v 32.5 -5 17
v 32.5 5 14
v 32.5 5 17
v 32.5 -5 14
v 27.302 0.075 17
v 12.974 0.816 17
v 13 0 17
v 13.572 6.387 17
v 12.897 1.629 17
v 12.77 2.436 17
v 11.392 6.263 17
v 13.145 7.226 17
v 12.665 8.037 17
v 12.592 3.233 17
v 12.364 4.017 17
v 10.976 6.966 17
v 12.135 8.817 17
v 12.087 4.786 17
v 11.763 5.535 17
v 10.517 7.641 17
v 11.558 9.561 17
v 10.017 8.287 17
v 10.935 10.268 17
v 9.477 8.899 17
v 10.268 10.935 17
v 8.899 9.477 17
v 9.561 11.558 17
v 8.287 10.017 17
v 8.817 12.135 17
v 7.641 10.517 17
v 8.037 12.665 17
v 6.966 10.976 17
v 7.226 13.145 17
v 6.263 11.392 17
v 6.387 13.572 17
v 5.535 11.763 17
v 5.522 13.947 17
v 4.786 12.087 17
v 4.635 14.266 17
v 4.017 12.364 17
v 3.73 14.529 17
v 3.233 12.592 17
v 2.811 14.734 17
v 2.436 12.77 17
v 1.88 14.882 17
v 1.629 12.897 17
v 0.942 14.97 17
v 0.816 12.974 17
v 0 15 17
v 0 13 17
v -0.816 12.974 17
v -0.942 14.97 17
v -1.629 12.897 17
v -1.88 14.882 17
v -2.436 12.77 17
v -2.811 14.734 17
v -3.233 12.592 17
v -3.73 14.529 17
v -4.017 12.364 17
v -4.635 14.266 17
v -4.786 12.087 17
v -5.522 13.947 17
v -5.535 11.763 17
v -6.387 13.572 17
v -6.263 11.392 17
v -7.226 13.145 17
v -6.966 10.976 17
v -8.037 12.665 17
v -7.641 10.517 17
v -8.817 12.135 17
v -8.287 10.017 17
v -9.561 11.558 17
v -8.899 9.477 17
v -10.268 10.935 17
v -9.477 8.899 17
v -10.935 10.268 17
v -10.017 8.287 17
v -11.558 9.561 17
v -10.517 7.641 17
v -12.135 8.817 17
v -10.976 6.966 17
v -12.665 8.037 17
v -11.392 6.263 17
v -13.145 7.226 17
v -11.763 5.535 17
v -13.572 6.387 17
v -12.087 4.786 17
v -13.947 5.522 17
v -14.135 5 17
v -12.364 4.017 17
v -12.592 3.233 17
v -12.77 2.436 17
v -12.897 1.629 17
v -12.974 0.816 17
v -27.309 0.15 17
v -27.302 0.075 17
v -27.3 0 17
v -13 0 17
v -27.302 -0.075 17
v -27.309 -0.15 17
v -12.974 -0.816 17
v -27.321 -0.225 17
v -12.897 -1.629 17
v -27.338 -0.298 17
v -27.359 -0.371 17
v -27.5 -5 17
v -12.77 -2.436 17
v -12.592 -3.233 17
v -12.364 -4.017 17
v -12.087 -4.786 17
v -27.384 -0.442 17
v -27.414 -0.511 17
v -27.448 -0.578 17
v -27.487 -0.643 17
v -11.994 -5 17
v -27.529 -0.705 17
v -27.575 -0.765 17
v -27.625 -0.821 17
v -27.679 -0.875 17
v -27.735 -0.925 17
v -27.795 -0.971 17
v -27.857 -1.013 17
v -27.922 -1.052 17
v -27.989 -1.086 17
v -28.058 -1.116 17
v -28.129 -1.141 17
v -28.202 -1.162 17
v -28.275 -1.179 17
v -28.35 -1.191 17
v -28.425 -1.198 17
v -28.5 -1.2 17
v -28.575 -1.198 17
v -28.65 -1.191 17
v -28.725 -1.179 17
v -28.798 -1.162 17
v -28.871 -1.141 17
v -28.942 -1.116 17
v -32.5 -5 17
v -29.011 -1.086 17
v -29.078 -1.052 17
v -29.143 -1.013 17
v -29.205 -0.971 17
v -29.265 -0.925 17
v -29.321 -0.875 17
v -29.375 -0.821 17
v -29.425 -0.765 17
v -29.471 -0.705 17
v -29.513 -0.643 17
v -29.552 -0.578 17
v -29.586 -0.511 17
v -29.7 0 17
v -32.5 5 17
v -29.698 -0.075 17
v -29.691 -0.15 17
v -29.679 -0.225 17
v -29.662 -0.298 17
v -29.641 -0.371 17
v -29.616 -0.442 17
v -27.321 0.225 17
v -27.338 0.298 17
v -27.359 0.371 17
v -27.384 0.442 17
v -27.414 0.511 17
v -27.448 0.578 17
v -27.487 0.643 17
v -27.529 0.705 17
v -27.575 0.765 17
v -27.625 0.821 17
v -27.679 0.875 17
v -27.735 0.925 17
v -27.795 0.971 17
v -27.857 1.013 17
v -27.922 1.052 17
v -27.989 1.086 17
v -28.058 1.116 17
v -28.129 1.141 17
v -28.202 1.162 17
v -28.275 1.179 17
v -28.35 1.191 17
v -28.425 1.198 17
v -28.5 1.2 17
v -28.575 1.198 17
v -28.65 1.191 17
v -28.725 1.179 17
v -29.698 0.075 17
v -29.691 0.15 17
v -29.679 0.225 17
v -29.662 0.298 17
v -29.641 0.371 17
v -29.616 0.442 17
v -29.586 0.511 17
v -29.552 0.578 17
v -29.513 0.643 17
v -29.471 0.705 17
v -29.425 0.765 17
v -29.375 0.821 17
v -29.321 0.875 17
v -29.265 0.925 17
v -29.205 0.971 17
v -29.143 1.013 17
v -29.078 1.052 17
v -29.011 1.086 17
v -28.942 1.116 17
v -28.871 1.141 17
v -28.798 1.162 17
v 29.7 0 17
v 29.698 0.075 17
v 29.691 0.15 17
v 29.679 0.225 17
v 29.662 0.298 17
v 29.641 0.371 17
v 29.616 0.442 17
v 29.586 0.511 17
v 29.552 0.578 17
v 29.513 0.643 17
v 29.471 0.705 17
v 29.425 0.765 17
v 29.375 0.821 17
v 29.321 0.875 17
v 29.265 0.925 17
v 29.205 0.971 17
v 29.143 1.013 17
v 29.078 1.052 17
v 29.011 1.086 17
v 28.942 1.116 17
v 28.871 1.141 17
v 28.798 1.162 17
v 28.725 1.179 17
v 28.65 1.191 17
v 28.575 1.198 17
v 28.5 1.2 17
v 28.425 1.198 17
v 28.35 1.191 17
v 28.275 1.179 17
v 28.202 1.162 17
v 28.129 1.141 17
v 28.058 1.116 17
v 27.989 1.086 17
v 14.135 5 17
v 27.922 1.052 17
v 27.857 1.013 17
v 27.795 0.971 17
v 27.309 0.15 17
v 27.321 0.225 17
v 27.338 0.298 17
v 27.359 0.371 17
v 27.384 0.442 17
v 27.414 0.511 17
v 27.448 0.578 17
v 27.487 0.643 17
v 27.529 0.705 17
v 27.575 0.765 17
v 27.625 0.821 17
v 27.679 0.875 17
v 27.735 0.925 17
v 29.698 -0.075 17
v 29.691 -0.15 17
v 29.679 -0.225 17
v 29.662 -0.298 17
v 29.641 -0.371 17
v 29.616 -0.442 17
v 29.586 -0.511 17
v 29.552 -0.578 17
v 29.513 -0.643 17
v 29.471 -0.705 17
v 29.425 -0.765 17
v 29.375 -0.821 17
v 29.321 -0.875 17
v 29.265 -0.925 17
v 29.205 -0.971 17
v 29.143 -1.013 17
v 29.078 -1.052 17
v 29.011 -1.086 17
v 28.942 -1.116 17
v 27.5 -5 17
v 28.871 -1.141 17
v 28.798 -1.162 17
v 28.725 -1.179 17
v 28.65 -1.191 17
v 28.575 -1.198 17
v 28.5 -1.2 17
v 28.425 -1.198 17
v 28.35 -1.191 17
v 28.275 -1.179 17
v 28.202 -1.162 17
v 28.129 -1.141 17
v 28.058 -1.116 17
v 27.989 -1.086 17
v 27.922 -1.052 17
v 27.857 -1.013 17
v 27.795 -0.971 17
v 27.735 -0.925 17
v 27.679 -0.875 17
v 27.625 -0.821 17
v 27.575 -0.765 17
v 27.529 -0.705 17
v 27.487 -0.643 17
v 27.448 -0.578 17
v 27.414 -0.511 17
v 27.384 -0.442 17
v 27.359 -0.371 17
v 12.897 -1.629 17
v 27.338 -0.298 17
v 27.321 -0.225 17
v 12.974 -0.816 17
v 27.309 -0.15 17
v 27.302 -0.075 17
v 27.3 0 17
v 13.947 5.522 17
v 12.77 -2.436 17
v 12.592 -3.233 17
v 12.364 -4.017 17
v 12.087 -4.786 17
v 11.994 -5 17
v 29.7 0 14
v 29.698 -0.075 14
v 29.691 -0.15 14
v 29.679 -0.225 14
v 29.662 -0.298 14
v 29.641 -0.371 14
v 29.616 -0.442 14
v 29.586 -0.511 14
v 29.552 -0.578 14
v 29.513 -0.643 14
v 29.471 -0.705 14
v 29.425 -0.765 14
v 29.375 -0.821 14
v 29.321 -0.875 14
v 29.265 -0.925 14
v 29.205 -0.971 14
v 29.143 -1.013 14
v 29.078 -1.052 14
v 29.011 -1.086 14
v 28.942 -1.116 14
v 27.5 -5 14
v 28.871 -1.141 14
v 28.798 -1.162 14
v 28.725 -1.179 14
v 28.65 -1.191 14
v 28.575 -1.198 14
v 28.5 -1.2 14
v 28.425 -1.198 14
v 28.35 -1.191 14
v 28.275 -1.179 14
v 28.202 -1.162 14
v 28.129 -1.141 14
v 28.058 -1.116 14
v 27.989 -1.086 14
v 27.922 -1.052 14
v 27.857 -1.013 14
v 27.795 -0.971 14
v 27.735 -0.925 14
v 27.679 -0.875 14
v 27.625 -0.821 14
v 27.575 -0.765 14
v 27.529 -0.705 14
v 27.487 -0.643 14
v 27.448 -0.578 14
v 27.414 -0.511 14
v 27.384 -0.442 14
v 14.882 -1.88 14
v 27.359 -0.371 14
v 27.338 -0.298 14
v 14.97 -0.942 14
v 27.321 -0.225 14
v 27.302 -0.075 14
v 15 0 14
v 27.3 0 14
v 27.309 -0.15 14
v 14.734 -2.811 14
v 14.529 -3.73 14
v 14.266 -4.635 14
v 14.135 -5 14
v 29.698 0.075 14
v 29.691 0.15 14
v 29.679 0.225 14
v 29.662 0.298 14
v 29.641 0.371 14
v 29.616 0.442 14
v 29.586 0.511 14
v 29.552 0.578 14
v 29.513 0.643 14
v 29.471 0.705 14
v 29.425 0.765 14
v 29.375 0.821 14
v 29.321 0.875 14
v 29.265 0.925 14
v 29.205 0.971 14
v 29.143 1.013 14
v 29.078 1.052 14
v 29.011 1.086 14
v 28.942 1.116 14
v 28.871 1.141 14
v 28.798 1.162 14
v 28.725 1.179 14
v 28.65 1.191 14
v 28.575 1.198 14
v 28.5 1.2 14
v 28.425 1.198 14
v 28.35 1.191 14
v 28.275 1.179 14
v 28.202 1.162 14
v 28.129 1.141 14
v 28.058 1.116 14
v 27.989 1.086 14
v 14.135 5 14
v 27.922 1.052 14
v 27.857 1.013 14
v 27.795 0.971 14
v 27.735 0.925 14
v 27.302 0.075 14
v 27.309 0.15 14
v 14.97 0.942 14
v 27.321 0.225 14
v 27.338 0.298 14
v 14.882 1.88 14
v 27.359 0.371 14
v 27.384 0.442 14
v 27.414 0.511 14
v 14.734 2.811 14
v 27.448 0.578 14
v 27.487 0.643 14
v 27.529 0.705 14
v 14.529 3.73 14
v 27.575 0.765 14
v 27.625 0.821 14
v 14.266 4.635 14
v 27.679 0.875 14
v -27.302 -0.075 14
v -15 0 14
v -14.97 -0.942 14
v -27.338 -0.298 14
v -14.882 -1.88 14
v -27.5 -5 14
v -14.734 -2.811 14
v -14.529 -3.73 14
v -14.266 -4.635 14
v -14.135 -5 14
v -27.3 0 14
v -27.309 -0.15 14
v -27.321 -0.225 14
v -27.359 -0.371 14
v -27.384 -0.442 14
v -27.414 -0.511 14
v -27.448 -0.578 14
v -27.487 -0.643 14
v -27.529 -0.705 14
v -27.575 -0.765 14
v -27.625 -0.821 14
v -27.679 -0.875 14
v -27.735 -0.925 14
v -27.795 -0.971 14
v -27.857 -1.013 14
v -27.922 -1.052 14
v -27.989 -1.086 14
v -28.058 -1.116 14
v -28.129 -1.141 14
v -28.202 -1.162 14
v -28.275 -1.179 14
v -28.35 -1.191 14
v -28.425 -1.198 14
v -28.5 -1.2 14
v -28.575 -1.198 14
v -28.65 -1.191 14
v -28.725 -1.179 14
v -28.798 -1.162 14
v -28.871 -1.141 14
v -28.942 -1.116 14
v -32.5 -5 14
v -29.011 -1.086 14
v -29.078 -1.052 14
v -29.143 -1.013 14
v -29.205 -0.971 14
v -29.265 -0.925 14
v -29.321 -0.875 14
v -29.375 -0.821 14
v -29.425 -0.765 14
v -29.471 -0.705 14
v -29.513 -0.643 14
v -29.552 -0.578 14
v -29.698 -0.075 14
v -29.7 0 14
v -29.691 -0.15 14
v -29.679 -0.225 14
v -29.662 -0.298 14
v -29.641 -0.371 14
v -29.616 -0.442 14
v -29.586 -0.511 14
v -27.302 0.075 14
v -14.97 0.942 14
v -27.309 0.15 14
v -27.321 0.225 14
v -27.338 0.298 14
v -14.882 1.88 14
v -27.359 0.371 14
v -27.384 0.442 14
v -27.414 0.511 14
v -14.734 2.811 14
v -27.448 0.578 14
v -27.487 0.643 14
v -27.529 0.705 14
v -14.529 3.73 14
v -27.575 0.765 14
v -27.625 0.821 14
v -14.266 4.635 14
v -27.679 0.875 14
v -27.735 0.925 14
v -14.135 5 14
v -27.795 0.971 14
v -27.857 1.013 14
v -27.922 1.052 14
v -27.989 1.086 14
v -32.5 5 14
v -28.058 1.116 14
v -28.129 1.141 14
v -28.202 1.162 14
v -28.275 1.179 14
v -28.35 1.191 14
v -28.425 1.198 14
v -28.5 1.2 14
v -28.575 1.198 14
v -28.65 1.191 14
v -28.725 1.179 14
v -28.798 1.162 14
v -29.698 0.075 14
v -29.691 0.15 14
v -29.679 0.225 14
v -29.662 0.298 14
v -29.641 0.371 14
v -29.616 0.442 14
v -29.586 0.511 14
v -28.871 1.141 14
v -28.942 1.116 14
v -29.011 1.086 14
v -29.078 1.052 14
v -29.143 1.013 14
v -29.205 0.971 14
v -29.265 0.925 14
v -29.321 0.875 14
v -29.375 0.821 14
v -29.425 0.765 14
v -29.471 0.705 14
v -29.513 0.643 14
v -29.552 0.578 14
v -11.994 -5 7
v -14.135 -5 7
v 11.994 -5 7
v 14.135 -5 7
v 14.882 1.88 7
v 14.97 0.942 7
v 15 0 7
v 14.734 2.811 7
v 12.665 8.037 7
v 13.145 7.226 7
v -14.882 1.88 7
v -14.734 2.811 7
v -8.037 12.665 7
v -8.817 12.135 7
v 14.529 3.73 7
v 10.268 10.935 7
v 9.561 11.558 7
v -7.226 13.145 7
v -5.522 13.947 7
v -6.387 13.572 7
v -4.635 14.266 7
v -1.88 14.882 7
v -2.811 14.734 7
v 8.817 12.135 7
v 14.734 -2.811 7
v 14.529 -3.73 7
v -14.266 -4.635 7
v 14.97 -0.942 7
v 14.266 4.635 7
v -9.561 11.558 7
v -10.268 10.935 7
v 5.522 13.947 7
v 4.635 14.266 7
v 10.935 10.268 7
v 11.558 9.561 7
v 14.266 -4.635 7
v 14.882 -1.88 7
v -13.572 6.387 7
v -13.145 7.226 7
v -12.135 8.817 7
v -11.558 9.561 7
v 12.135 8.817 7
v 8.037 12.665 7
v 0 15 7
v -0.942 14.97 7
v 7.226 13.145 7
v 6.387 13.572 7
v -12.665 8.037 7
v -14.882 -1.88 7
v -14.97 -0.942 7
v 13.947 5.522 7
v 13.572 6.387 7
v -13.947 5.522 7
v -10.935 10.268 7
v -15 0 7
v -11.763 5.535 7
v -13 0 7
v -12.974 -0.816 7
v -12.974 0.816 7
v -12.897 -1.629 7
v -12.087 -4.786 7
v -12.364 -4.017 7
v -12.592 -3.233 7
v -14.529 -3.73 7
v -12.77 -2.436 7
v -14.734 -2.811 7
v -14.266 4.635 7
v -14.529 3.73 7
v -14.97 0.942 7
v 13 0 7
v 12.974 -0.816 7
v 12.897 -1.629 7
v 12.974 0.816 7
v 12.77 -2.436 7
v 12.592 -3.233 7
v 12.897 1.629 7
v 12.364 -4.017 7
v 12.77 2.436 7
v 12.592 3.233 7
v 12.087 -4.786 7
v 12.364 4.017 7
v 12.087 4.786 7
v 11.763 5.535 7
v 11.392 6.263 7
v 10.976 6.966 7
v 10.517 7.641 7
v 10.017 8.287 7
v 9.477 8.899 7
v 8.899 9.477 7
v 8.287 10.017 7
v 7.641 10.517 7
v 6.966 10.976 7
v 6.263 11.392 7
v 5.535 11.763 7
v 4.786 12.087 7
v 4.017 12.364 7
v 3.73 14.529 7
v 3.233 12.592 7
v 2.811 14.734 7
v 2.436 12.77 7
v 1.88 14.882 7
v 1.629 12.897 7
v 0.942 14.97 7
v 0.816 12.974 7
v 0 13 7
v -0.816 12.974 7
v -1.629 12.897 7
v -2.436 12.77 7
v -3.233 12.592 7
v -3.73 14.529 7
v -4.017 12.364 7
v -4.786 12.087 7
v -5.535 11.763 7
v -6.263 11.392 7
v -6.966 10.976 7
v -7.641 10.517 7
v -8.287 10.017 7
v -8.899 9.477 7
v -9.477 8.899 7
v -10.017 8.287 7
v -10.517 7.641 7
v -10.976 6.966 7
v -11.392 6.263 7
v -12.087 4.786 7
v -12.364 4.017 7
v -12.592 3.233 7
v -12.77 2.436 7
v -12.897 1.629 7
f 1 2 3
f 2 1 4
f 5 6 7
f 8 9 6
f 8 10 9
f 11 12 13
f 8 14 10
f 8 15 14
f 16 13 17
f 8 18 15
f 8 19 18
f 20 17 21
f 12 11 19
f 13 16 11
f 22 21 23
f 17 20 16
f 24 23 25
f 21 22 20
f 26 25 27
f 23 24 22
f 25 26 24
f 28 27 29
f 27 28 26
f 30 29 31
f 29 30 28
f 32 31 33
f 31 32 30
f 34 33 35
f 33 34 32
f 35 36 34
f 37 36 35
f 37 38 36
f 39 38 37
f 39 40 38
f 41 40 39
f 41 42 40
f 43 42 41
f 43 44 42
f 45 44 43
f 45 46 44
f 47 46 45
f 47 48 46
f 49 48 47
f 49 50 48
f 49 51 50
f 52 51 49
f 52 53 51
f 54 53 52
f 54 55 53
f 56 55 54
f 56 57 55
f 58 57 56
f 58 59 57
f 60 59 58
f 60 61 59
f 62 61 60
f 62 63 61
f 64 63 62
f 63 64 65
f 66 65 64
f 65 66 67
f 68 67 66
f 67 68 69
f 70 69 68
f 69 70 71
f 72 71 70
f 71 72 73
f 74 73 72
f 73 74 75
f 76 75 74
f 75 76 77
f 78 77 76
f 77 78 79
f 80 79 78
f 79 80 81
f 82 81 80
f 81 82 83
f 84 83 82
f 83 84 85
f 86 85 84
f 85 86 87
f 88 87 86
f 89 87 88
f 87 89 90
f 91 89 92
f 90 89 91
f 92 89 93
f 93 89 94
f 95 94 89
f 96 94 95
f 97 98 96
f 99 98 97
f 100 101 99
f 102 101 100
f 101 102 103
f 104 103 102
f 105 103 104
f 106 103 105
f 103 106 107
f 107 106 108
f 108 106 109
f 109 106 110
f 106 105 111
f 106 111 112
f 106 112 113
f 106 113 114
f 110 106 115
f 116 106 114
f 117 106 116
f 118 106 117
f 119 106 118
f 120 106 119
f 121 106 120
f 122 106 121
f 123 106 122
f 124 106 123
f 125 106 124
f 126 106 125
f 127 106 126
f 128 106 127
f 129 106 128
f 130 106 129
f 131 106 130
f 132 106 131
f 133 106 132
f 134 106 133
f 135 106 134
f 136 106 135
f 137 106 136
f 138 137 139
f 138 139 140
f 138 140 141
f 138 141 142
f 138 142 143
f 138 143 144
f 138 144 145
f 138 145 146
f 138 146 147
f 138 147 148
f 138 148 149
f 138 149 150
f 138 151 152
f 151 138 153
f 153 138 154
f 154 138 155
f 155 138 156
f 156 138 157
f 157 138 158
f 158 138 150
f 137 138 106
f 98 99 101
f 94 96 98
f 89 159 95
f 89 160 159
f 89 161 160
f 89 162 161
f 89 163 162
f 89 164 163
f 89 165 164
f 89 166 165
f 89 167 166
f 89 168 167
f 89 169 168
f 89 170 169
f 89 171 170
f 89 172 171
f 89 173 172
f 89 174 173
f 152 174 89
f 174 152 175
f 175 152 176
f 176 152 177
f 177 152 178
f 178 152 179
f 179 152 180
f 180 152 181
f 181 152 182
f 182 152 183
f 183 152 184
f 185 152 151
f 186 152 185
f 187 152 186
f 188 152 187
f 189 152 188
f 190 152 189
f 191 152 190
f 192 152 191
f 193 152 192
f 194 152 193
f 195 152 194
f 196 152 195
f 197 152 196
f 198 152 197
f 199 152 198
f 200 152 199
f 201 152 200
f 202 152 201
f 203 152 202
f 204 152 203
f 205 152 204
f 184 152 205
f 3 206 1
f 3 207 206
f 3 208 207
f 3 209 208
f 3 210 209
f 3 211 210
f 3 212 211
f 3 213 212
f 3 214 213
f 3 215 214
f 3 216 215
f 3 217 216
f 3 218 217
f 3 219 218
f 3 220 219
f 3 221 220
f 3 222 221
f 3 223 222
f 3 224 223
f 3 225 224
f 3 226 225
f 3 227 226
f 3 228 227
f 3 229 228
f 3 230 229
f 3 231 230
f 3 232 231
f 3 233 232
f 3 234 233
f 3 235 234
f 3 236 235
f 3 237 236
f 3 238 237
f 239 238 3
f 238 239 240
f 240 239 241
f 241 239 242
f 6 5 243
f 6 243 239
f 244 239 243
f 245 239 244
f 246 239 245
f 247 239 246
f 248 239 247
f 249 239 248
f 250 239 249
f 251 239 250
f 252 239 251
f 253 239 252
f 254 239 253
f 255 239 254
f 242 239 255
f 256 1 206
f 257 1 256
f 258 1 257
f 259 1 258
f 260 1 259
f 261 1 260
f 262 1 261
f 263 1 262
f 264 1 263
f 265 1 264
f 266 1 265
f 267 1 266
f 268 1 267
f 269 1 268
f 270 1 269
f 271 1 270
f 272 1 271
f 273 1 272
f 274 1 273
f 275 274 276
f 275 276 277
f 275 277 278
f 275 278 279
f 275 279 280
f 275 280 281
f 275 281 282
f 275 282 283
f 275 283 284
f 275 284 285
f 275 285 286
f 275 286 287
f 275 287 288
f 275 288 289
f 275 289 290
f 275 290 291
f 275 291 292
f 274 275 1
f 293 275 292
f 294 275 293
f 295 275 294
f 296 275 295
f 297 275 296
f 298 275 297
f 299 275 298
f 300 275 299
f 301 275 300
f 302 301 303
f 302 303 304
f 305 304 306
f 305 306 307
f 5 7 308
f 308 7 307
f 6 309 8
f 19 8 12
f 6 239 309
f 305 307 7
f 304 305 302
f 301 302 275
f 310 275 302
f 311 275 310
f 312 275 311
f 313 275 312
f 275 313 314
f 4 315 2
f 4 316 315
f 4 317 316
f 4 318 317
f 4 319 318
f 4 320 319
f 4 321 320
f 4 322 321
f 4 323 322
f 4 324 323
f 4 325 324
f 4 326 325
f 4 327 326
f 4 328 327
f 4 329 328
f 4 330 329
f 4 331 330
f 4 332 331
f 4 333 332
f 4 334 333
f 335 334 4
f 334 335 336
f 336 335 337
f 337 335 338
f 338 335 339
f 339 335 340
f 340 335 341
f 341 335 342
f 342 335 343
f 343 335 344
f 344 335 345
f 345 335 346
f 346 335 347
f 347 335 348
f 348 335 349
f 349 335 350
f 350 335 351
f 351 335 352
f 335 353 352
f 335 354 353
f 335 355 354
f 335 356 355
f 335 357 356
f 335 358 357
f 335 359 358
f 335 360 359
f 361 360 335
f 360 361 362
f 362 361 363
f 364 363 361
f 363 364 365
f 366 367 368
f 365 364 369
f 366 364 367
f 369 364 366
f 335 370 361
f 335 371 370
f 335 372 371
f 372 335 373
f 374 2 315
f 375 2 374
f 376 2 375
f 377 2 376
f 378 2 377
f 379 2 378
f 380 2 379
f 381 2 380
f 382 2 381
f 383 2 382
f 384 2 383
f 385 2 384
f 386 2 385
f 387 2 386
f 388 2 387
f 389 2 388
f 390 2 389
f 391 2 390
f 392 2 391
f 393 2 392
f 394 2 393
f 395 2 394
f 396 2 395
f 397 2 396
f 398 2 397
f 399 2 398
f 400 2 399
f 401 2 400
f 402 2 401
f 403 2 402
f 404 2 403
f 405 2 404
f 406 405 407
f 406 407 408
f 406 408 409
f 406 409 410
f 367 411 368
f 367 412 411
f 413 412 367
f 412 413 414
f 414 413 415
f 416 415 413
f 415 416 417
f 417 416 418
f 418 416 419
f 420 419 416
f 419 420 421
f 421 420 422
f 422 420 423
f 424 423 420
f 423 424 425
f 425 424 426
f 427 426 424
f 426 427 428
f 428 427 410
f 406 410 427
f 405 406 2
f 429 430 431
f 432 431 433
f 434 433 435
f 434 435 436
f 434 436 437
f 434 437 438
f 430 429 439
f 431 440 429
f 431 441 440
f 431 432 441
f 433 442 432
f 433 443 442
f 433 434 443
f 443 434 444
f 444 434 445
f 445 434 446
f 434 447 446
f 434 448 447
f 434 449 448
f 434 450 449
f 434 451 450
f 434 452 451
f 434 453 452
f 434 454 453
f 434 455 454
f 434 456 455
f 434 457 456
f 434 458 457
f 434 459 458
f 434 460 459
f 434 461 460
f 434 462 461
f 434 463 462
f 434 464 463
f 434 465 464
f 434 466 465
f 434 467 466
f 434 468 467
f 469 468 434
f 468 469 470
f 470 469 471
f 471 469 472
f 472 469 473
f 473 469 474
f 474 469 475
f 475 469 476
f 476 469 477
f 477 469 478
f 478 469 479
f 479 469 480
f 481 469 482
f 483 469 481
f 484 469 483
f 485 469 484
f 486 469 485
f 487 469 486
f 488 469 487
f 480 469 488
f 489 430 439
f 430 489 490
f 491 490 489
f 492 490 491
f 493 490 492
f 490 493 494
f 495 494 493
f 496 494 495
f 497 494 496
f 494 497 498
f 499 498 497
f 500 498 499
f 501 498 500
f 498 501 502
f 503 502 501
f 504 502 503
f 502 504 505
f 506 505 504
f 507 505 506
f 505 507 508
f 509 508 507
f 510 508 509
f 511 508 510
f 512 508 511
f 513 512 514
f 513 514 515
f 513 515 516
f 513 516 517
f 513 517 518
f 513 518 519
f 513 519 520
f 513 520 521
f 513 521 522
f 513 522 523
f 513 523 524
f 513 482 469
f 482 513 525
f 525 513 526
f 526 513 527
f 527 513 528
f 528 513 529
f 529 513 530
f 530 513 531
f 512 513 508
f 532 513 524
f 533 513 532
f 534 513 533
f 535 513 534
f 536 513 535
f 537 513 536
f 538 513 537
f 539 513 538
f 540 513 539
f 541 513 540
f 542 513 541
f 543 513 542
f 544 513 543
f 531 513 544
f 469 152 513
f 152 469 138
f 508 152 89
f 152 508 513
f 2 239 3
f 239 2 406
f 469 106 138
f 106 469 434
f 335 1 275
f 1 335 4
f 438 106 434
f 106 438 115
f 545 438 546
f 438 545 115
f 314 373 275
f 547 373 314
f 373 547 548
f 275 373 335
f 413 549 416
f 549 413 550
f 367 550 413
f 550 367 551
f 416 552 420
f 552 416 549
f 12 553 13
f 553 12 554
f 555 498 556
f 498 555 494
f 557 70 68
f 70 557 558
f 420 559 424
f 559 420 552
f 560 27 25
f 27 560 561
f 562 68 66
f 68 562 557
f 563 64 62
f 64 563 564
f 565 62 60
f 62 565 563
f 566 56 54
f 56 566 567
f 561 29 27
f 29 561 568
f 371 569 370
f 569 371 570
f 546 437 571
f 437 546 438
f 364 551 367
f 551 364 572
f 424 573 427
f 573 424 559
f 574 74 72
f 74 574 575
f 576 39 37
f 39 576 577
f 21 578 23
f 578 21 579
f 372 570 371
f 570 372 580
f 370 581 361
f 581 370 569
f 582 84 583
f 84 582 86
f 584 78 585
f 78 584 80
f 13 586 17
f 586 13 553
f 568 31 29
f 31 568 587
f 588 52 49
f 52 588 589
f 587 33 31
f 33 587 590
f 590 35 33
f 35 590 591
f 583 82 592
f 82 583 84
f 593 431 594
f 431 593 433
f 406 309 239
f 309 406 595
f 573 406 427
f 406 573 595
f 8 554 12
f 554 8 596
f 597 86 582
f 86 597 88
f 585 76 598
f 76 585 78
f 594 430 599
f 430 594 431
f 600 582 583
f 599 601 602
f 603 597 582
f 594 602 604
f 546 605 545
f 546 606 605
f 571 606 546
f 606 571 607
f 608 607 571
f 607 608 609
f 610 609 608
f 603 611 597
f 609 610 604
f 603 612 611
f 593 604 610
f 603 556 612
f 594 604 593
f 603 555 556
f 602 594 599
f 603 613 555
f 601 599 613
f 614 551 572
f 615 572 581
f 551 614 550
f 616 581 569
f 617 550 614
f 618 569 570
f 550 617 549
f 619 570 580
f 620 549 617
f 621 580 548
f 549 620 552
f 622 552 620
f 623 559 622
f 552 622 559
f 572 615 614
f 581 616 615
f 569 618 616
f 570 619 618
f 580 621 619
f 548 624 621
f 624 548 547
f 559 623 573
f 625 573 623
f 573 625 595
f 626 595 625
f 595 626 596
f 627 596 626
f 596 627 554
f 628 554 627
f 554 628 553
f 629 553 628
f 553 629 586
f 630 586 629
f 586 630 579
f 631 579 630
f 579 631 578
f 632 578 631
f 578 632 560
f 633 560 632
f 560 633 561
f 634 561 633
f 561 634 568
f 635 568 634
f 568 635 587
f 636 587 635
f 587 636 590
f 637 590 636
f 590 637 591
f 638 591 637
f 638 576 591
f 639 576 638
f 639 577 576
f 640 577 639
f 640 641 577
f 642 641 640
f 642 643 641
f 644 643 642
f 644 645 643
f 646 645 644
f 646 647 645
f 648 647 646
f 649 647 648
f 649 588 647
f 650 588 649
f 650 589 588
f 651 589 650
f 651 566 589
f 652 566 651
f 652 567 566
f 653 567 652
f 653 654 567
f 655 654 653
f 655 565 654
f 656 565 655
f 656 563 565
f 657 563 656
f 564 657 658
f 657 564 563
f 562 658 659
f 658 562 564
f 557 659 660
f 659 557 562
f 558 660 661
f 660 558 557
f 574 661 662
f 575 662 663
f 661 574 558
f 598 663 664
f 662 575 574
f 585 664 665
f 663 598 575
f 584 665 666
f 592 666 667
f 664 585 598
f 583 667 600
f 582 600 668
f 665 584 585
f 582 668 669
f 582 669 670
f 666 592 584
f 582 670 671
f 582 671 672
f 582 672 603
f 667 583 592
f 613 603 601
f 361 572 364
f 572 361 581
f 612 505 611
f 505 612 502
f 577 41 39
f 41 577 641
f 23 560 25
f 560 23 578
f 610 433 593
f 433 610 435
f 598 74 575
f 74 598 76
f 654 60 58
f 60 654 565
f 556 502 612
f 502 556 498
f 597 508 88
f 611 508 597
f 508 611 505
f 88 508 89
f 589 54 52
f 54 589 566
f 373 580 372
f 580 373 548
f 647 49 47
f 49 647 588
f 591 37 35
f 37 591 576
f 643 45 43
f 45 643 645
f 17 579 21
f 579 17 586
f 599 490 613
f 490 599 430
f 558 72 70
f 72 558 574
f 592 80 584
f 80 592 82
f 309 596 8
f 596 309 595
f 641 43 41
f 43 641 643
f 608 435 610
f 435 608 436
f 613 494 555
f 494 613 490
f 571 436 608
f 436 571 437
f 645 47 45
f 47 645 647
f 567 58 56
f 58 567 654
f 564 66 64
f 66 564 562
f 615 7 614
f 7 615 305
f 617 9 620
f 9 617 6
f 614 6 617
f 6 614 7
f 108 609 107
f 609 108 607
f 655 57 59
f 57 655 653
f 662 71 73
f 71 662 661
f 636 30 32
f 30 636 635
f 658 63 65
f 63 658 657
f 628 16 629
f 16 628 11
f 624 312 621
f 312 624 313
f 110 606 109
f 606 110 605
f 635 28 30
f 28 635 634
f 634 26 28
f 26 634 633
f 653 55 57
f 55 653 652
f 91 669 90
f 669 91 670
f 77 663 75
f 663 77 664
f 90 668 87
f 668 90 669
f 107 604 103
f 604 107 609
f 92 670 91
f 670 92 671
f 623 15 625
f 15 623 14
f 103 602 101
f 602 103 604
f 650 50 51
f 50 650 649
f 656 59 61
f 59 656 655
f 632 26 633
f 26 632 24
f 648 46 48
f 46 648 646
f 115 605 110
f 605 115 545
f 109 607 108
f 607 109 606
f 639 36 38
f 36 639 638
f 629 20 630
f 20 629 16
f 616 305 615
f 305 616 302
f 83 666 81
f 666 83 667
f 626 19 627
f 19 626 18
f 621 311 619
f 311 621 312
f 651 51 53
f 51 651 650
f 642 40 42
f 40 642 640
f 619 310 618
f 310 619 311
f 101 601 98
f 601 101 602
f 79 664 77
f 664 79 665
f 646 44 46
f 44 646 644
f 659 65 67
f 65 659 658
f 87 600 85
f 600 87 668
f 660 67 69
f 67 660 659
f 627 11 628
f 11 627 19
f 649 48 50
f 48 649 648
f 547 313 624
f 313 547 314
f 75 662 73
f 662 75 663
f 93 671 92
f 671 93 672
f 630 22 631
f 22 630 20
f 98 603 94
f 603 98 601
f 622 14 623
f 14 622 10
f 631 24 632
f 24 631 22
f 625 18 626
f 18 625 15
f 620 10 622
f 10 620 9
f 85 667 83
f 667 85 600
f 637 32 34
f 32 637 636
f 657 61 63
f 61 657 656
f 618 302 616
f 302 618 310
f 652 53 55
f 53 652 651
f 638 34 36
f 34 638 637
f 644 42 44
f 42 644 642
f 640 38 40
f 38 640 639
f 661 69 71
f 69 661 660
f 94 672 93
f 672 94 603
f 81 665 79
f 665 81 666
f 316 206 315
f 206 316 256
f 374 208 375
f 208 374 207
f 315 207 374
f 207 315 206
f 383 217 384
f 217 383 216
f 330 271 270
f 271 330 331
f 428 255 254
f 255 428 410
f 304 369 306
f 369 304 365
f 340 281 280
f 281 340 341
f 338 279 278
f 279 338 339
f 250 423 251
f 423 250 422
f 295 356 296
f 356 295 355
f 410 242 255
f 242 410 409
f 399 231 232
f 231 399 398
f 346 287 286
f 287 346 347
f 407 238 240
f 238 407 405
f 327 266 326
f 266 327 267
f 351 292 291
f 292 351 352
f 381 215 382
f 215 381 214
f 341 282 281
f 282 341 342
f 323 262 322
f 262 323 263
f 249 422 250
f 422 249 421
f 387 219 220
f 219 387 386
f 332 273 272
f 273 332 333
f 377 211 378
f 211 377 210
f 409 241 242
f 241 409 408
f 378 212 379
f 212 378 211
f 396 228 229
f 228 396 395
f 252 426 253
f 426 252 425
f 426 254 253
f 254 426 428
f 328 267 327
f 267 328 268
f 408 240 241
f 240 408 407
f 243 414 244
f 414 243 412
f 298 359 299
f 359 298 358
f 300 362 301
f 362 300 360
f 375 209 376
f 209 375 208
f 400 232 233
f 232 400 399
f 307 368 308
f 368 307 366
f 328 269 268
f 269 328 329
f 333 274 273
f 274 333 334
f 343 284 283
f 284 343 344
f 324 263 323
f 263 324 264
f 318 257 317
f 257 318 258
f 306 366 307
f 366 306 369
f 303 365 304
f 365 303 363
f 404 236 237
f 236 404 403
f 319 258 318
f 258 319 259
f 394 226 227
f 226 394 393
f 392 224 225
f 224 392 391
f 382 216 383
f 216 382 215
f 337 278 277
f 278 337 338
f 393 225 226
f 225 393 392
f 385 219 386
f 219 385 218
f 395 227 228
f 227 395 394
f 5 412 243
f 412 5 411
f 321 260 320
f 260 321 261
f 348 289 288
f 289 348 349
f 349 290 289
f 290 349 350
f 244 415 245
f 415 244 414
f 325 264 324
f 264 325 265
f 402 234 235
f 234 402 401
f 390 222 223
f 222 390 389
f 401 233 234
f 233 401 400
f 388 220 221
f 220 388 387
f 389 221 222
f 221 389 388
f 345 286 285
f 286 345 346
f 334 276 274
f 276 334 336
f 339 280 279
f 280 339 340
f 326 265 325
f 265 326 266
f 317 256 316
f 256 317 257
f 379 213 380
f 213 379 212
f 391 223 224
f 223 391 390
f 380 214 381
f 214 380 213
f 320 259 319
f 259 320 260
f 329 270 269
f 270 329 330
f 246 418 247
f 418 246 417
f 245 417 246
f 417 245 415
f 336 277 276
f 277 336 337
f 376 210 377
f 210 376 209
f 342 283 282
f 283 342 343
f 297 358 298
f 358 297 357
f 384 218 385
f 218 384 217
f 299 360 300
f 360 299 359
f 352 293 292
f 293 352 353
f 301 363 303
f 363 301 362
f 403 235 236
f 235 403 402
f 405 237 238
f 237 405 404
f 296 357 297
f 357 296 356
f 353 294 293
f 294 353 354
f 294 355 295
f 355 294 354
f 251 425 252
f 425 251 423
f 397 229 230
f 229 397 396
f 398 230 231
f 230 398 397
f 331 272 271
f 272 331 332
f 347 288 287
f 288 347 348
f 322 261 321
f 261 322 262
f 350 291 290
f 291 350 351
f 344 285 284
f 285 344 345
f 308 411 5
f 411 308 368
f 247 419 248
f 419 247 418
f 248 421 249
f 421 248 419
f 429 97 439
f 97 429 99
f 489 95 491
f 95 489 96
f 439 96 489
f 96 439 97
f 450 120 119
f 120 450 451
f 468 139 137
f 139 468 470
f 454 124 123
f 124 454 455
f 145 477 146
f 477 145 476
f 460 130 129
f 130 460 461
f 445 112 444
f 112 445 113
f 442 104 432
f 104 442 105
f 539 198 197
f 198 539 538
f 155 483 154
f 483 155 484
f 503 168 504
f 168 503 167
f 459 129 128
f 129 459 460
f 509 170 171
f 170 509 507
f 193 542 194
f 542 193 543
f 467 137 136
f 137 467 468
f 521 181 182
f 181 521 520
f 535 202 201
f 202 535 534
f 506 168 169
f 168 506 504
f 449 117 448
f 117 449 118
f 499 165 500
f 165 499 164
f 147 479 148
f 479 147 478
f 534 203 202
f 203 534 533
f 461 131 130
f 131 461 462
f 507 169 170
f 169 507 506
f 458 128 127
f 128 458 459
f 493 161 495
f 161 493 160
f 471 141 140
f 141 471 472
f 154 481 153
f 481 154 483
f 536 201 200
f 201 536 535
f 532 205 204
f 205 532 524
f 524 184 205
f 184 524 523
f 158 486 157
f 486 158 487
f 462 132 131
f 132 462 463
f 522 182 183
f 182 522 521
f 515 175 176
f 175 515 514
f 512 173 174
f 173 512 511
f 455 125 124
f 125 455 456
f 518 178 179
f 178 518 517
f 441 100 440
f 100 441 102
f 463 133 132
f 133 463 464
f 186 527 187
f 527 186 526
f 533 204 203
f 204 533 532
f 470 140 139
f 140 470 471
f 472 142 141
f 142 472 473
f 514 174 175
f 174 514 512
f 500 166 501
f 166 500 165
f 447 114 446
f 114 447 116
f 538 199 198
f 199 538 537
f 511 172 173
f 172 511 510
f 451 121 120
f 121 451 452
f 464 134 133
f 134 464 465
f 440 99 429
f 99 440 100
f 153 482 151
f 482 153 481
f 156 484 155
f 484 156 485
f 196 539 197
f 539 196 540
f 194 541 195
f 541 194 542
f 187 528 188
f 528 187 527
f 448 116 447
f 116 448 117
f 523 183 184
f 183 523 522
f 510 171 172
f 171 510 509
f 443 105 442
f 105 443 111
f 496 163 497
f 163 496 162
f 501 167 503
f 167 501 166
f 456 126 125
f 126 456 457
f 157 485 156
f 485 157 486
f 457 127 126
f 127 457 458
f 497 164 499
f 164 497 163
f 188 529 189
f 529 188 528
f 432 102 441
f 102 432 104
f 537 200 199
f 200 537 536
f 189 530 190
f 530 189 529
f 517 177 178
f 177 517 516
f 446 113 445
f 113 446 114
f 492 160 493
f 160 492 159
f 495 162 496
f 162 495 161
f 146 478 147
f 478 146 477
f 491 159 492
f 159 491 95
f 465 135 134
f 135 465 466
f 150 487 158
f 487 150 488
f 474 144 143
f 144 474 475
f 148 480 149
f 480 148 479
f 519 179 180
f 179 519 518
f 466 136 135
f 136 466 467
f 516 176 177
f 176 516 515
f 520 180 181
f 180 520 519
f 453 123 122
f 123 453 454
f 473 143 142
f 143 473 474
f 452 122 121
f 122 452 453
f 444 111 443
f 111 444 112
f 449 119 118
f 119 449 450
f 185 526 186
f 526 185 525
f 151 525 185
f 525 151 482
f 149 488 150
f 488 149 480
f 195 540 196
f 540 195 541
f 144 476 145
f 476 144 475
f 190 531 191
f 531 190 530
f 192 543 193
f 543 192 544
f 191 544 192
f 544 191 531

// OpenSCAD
difference(){
	union(){
        translate([-65/2,-5,14]){
           cube([65,10,3], center=false);
        }

        translate([0,0,7]){
            rotate([0,0,0]){
                cylinder(h=10, r=15, $fn=100, center=false);
            }
        }
   
 
	}
	union() {
        translate([-55/2,-15,-1]){
           cube([55,10,30], center=false);
        }
        translate([0,0,2]){
            rotate([0,0,0]){
                cylinder(h=18, r=13, $fn=100, center=false);
            }
        }

        translate([21+7.5,0,-1]){
            rotate([0,0,0]){
                cylinder(h=28, r=1.2, $fn=100, center=false);
            }
        }
        translate([-21-7.5,0,-1]){
            rotate([0,0,0]){
                cylinder(h=28, r=1.2, $fn=100, center=false);
            }
        }



	}
}
